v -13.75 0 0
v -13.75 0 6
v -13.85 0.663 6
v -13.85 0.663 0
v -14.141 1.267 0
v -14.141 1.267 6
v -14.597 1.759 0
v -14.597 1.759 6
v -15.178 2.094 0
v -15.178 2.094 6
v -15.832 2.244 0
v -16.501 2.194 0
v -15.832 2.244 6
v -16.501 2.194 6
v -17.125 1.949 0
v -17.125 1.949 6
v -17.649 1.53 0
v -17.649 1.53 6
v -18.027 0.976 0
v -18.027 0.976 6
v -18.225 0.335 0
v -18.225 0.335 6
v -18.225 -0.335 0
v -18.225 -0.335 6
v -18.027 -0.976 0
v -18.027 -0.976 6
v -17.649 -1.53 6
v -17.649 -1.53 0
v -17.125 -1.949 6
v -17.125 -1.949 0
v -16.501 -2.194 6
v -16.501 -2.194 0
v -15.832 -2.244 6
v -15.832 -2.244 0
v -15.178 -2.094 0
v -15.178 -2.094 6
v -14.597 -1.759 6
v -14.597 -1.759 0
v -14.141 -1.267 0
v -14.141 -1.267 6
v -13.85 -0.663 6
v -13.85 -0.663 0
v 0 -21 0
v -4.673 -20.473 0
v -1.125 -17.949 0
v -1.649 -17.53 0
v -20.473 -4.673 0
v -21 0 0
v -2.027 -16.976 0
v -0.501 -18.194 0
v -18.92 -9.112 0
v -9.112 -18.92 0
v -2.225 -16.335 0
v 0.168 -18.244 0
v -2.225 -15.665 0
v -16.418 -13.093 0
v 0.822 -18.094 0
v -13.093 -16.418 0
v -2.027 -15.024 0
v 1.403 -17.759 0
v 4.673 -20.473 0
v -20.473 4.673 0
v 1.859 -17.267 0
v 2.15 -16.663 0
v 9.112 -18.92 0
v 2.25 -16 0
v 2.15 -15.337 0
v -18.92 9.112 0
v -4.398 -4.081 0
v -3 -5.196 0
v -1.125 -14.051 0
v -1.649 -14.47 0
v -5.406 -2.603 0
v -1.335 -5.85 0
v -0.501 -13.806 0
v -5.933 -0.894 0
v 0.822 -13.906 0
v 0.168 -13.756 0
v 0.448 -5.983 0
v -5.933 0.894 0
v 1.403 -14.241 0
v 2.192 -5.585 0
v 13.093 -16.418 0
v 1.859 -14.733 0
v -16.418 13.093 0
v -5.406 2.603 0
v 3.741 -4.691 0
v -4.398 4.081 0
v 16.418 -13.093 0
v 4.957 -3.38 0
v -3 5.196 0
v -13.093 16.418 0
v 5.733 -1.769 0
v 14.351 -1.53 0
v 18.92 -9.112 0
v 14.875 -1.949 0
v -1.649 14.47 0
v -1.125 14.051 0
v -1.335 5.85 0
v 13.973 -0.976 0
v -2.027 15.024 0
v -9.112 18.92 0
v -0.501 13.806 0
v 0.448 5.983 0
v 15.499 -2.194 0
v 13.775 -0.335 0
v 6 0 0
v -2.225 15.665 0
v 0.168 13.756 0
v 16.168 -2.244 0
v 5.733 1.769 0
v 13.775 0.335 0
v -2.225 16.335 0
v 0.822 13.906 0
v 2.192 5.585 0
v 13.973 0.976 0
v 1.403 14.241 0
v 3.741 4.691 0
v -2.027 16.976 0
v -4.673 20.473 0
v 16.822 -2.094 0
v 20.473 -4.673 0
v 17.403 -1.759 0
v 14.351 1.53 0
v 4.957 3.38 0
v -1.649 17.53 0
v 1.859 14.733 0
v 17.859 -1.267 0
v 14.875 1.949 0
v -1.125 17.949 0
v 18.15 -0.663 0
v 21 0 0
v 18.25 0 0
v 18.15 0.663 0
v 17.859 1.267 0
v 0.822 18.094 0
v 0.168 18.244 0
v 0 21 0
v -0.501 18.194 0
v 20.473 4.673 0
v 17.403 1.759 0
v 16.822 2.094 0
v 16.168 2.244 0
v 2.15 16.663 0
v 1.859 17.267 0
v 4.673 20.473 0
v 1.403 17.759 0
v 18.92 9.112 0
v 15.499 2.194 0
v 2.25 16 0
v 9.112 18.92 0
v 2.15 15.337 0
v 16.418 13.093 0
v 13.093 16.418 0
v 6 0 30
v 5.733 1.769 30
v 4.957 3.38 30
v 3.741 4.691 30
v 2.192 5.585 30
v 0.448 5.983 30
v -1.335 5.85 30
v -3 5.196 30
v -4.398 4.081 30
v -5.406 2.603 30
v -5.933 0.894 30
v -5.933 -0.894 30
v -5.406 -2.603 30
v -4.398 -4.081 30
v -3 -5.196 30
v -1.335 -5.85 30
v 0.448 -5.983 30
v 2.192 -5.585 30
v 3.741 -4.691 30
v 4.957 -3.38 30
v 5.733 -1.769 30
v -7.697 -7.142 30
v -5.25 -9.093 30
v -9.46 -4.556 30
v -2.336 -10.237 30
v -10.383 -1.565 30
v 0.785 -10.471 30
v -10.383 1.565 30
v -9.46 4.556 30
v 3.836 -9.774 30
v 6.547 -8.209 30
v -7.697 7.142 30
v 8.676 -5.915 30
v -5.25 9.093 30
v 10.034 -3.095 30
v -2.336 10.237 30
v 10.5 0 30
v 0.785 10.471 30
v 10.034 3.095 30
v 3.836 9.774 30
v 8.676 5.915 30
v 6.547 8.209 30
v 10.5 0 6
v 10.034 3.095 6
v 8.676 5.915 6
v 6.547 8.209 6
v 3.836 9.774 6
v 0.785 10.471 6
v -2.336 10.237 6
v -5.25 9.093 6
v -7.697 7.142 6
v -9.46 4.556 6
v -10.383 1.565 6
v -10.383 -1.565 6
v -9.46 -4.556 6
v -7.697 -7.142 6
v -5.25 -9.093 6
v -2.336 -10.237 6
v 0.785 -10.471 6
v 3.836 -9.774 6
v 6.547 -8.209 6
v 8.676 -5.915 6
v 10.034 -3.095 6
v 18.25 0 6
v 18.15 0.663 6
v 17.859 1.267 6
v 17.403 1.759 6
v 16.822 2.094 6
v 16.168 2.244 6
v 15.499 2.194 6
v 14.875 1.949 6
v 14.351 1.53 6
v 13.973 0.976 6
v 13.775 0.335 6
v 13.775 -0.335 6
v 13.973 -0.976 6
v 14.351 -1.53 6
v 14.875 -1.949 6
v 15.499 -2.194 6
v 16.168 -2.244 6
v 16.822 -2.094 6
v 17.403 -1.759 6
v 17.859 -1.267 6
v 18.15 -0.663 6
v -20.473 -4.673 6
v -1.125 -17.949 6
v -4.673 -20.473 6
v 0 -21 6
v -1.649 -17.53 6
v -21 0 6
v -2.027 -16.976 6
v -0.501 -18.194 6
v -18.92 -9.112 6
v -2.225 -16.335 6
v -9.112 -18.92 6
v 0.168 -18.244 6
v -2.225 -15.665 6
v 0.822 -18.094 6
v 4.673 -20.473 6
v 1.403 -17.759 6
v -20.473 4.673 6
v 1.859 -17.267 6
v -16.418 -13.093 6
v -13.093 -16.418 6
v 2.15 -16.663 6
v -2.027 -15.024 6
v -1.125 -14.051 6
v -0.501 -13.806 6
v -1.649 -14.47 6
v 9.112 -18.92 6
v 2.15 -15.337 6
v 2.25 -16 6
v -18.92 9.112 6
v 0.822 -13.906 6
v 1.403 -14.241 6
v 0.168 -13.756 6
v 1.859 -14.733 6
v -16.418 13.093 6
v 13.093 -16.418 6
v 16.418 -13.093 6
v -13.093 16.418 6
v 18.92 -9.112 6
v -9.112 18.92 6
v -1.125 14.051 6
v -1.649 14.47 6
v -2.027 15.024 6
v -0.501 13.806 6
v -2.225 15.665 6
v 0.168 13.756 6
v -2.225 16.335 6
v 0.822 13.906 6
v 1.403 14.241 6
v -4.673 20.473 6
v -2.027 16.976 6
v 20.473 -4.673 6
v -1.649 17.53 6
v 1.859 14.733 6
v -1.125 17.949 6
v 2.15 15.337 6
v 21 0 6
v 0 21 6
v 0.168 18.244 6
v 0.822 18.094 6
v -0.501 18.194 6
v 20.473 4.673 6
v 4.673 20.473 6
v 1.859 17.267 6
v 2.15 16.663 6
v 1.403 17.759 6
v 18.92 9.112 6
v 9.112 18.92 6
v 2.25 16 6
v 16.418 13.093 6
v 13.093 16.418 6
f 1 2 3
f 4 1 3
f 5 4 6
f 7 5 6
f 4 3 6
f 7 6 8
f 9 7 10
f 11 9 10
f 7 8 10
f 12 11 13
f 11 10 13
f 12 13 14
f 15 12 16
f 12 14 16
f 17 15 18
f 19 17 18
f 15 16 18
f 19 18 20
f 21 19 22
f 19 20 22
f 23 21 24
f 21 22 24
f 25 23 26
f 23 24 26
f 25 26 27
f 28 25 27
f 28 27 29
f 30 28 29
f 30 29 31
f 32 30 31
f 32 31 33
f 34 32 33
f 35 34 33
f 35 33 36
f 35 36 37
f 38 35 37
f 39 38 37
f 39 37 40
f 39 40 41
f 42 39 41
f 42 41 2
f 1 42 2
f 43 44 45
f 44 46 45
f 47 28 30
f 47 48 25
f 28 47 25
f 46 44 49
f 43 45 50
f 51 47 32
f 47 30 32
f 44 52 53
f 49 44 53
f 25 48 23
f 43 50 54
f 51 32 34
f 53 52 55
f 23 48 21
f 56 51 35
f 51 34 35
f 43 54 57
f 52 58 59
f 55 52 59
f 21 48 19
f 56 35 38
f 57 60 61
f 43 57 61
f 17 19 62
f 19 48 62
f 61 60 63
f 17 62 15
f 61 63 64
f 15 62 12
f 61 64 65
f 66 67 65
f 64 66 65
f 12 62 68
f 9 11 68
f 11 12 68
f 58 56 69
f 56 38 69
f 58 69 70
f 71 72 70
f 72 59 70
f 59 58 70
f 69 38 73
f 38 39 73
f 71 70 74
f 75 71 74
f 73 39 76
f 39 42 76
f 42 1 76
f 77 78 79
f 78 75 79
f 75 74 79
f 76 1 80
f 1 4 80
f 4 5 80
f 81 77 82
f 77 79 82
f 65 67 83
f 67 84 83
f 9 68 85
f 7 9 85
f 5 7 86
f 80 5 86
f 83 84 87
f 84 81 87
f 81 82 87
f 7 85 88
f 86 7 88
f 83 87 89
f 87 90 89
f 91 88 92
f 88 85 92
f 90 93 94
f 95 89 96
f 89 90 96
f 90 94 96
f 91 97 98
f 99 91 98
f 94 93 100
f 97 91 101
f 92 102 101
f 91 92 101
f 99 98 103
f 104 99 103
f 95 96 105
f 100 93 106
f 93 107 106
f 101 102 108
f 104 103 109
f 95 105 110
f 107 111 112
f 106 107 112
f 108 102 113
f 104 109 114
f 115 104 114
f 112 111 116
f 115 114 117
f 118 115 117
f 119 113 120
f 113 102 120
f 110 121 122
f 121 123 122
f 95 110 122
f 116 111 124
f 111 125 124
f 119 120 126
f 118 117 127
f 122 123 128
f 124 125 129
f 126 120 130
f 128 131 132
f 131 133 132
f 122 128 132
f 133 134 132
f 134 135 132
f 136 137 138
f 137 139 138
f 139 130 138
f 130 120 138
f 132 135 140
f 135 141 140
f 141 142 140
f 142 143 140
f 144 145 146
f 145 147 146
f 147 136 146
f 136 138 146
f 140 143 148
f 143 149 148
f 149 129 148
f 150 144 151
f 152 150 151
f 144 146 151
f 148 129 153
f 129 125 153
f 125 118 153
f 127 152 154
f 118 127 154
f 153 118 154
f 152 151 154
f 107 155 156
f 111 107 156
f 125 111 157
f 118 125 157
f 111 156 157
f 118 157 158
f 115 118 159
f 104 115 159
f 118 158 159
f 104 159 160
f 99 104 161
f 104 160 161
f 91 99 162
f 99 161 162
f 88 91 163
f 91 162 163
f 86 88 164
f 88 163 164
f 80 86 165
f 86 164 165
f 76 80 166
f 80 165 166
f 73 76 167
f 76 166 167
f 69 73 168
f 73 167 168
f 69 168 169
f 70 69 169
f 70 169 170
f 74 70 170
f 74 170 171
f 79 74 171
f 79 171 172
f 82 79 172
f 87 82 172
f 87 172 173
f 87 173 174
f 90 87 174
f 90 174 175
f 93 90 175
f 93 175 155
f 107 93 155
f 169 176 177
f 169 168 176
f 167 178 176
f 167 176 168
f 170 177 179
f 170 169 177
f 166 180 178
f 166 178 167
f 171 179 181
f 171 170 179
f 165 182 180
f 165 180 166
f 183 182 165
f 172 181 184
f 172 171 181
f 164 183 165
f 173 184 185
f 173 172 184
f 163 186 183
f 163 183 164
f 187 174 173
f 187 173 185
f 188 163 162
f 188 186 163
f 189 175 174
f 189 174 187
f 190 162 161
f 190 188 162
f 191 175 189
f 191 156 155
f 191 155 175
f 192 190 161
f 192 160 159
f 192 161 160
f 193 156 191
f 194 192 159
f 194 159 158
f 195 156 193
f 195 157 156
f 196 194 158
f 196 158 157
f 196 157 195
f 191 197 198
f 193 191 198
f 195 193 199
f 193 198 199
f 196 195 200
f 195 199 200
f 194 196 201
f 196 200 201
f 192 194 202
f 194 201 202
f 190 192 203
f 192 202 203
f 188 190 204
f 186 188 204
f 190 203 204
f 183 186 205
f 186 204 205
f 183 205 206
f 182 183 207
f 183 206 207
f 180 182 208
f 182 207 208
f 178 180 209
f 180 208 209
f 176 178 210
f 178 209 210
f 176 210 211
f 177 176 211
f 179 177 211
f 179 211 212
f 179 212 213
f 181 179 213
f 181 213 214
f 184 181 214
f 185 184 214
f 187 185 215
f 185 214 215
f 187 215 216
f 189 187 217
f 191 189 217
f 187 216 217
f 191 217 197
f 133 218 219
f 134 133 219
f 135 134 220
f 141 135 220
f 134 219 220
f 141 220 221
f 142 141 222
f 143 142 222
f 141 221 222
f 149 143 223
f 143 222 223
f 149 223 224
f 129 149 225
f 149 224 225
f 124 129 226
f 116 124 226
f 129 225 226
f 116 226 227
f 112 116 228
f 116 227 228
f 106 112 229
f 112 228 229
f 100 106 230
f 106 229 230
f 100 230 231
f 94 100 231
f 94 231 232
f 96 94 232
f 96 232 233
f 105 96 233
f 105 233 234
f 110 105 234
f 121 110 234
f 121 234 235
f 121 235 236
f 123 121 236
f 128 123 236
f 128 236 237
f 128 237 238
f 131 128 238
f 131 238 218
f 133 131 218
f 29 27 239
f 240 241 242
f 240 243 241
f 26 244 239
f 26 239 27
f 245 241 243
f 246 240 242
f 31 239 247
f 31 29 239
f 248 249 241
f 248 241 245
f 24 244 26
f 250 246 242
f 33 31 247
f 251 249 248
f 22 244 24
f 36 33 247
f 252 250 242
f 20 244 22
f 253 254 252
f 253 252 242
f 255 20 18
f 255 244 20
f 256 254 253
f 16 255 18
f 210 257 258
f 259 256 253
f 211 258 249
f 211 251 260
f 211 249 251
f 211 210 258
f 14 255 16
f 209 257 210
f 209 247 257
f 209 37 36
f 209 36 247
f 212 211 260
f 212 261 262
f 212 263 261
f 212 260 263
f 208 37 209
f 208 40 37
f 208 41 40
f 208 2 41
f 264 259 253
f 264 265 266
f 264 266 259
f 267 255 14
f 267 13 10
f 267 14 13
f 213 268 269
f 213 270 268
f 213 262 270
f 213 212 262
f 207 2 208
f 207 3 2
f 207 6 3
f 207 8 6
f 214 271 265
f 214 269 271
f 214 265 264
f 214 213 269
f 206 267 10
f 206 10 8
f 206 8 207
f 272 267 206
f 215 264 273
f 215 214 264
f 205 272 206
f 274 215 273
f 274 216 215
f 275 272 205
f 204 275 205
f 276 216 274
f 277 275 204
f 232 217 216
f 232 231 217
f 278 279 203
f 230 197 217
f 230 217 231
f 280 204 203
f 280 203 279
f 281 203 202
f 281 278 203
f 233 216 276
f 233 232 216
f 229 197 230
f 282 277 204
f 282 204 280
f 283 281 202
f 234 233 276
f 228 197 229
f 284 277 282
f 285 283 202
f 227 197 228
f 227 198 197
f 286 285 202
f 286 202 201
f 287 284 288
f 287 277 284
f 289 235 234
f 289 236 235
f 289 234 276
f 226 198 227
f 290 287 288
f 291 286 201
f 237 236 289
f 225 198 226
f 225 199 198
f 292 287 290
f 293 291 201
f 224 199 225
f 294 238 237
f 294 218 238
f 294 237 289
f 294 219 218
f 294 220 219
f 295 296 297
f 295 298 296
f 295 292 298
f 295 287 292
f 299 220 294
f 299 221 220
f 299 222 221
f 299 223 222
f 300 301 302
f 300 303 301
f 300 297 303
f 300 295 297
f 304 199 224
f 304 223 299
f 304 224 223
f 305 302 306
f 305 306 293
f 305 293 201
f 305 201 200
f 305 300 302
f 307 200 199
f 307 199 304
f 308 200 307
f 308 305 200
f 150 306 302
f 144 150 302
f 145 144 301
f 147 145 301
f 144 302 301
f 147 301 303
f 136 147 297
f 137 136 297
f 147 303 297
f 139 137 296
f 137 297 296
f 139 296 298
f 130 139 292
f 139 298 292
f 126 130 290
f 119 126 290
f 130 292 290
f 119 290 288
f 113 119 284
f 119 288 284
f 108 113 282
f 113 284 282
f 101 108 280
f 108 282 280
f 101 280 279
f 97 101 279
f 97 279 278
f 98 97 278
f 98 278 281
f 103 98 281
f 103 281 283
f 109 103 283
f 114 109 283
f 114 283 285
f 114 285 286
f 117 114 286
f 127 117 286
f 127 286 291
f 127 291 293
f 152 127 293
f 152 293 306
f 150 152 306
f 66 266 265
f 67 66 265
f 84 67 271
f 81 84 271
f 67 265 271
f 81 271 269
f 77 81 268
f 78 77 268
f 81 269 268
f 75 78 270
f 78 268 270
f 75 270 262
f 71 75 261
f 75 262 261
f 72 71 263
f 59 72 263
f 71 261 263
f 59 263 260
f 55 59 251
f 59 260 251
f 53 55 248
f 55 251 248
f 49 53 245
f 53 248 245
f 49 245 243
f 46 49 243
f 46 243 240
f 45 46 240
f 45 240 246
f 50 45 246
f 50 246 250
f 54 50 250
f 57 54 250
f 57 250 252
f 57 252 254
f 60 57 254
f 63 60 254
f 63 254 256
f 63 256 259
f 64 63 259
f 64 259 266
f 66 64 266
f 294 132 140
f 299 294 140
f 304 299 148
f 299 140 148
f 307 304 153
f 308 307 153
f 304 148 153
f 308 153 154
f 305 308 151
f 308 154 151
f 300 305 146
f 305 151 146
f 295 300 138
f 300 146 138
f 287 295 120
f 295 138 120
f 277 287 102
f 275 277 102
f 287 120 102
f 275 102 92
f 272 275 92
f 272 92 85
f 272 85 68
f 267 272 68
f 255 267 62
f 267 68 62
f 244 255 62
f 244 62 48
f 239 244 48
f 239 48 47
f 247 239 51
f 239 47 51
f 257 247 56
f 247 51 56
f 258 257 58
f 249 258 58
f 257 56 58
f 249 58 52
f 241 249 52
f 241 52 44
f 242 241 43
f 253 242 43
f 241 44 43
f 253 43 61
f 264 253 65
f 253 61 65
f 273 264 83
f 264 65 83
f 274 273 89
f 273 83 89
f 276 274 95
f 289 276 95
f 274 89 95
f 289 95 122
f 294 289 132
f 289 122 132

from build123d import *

# Parameters (mm, degrees)
SKETCH1_R           = 21
BOSS_EXTRUDE1_DEPTH = 6
SKETCH2_R           = 10.5
BOSS_EXTRUDE2_DEPTH = 24
SKETCH3_R           = 6
CUT_EXTRUDE1_DEPTH  = 43.213741838
SKETCH4_R           = 2.25
CUT_EXTRUDE2_DEPTH  = 39.183766184


with BuildPart() as part:
    # Sketch1 → Boss-Extrude1 (new body)
    with BuildSketch(Plane.XY):
        Circle(SKETCH1_R)
    extrude(amount=BOSS_EXTRUDE1_DEPTH)

    # Sketch2 → Boss-Extrude2 (add)
    with BuildSketch(Plane.XY.offset(6)):
        Circle(SKETCH2_R)
    extrude(amount=BOSS_EXTRUDE2_DEPTH)

    # Sketch3 → Cut-Extrude1 (cut, through all)
    with BuildSketch(Plane.XY.offset(30)):
        Circle(SKETCH3_R)
    extrude(amount=-CUT_EXTRUDE1_DEPTH, mode=Mode.SUBTRACT)

    # Sketch4 → Cut-Extrude2 (cut, through all)
    with BuildSketch(Plane.XY.offset(6)):
        with Locations((-16, 0)):
            Circle(SKETCH4_R)
        with Locations((0, 16)):
            Circle(SKETCH4_R)
        with Locations((16, 0)):
            Circle(SKETCH4_R)
        with Locations((0, -16)):
            Circle(SKETCH4_R)
    extrude(amount=-CUT_EXTRUDE2_DEPTH, mode=Mode.SUBTRACT)


solid = part.part
